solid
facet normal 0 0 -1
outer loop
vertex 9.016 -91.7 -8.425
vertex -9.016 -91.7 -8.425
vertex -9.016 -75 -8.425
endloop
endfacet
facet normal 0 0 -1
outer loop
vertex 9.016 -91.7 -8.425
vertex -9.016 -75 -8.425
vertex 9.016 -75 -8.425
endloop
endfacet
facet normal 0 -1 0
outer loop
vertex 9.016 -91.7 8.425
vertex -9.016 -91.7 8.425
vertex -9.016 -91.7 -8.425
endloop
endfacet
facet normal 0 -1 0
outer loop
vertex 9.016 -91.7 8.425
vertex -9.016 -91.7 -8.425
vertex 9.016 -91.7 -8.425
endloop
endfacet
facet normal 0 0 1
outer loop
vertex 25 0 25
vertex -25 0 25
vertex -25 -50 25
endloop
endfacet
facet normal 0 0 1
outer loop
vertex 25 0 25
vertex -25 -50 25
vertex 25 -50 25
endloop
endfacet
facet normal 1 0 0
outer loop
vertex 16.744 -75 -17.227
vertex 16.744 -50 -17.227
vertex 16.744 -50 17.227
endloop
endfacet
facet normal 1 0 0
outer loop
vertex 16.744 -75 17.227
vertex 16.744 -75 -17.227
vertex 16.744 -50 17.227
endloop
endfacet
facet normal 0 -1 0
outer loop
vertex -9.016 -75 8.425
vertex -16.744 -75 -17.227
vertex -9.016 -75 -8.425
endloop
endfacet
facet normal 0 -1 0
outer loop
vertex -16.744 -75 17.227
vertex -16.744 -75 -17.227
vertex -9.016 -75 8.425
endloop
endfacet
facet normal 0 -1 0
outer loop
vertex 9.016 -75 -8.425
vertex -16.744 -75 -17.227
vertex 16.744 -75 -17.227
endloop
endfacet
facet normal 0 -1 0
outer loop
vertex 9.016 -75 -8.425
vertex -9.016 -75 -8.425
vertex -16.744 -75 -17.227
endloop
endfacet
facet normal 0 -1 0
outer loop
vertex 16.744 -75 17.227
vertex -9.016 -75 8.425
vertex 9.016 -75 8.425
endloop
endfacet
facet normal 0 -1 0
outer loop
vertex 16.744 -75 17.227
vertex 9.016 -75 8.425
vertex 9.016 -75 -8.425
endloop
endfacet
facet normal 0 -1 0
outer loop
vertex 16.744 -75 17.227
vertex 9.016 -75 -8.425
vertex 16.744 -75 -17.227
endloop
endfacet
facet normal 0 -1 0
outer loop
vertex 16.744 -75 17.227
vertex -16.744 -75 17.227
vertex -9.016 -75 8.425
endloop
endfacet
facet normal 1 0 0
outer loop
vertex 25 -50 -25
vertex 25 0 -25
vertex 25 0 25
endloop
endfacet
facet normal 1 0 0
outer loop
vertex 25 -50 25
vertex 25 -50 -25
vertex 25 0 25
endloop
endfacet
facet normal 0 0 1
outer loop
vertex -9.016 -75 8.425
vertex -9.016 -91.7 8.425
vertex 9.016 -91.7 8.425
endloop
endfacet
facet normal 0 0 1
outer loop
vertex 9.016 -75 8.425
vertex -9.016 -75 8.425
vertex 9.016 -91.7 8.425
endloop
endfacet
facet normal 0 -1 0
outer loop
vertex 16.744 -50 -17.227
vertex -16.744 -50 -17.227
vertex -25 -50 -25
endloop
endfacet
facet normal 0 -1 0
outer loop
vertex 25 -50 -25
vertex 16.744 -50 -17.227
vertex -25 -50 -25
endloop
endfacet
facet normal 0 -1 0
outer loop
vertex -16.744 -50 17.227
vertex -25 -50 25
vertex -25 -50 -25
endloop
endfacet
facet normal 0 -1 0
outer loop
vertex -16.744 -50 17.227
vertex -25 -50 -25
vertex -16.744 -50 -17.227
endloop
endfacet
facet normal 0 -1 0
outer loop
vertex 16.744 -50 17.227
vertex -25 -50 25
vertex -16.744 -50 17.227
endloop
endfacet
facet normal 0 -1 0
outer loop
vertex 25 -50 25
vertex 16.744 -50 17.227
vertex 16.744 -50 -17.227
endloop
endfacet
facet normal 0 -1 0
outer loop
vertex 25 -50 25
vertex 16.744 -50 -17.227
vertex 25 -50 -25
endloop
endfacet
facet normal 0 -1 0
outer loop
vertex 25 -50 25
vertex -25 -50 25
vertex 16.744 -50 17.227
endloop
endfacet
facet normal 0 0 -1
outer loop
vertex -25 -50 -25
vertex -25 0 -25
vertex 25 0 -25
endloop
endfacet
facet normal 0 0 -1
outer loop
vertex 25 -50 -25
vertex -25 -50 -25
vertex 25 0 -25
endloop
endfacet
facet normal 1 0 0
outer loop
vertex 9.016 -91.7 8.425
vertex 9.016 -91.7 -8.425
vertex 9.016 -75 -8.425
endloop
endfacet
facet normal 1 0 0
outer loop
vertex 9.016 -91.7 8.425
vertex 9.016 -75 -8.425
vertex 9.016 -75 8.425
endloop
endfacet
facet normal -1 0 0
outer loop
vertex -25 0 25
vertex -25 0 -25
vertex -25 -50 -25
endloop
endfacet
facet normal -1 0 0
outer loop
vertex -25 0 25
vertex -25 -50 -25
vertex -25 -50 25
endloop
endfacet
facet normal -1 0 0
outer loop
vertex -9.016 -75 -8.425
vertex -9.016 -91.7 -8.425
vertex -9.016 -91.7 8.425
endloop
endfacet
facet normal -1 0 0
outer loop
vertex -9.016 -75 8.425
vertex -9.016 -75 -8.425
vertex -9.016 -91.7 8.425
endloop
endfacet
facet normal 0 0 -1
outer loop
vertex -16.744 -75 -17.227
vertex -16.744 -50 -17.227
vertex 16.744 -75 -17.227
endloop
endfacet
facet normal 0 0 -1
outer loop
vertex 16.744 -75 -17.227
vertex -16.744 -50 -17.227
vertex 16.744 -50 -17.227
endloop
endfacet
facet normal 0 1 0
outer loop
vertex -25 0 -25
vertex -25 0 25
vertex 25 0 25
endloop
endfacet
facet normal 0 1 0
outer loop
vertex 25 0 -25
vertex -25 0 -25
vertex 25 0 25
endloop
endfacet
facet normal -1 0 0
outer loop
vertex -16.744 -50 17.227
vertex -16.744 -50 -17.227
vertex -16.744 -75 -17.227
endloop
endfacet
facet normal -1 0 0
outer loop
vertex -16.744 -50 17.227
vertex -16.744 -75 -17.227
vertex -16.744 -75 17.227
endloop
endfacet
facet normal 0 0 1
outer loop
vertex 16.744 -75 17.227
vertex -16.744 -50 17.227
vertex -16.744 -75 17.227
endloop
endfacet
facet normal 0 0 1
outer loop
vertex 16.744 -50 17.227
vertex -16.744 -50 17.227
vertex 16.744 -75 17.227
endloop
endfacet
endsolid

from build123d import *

# Parameters (mm, degrees)
F0_W     = 50
F0_H     = 50
F1_DEPTH = 50
F2_W     = 33.4872
F2_H     = 34.45318
F3_DEPTH = 25
F4_W     = 18.03157
F4_H     = 16.849448
F5_DEPTH = 16.7


with BuildPart() as f1:
    # F0 (on Front) → F1 (new body)
    with BuildSketch(Plane.XZ):
        Rectangle(F0_W, F0_H)
    extrude(amount=F1_DEPTH)

    # F2 (on face) → F3 (join)
    with BuildSketch(Plane.XZ.offset(50)):
        Rectangle(F2_W, F2_H)
    extrude(amount=F3_DEPTH)

    # F4 (on face) → F5 (join, symmetric)
    with BuildSketch(Plane.XZ.offset(75)):
        Rectangle(F4_W, F4_H)
    extrude(amount=F5_DEPTH, both=True)


solid = f1.part
